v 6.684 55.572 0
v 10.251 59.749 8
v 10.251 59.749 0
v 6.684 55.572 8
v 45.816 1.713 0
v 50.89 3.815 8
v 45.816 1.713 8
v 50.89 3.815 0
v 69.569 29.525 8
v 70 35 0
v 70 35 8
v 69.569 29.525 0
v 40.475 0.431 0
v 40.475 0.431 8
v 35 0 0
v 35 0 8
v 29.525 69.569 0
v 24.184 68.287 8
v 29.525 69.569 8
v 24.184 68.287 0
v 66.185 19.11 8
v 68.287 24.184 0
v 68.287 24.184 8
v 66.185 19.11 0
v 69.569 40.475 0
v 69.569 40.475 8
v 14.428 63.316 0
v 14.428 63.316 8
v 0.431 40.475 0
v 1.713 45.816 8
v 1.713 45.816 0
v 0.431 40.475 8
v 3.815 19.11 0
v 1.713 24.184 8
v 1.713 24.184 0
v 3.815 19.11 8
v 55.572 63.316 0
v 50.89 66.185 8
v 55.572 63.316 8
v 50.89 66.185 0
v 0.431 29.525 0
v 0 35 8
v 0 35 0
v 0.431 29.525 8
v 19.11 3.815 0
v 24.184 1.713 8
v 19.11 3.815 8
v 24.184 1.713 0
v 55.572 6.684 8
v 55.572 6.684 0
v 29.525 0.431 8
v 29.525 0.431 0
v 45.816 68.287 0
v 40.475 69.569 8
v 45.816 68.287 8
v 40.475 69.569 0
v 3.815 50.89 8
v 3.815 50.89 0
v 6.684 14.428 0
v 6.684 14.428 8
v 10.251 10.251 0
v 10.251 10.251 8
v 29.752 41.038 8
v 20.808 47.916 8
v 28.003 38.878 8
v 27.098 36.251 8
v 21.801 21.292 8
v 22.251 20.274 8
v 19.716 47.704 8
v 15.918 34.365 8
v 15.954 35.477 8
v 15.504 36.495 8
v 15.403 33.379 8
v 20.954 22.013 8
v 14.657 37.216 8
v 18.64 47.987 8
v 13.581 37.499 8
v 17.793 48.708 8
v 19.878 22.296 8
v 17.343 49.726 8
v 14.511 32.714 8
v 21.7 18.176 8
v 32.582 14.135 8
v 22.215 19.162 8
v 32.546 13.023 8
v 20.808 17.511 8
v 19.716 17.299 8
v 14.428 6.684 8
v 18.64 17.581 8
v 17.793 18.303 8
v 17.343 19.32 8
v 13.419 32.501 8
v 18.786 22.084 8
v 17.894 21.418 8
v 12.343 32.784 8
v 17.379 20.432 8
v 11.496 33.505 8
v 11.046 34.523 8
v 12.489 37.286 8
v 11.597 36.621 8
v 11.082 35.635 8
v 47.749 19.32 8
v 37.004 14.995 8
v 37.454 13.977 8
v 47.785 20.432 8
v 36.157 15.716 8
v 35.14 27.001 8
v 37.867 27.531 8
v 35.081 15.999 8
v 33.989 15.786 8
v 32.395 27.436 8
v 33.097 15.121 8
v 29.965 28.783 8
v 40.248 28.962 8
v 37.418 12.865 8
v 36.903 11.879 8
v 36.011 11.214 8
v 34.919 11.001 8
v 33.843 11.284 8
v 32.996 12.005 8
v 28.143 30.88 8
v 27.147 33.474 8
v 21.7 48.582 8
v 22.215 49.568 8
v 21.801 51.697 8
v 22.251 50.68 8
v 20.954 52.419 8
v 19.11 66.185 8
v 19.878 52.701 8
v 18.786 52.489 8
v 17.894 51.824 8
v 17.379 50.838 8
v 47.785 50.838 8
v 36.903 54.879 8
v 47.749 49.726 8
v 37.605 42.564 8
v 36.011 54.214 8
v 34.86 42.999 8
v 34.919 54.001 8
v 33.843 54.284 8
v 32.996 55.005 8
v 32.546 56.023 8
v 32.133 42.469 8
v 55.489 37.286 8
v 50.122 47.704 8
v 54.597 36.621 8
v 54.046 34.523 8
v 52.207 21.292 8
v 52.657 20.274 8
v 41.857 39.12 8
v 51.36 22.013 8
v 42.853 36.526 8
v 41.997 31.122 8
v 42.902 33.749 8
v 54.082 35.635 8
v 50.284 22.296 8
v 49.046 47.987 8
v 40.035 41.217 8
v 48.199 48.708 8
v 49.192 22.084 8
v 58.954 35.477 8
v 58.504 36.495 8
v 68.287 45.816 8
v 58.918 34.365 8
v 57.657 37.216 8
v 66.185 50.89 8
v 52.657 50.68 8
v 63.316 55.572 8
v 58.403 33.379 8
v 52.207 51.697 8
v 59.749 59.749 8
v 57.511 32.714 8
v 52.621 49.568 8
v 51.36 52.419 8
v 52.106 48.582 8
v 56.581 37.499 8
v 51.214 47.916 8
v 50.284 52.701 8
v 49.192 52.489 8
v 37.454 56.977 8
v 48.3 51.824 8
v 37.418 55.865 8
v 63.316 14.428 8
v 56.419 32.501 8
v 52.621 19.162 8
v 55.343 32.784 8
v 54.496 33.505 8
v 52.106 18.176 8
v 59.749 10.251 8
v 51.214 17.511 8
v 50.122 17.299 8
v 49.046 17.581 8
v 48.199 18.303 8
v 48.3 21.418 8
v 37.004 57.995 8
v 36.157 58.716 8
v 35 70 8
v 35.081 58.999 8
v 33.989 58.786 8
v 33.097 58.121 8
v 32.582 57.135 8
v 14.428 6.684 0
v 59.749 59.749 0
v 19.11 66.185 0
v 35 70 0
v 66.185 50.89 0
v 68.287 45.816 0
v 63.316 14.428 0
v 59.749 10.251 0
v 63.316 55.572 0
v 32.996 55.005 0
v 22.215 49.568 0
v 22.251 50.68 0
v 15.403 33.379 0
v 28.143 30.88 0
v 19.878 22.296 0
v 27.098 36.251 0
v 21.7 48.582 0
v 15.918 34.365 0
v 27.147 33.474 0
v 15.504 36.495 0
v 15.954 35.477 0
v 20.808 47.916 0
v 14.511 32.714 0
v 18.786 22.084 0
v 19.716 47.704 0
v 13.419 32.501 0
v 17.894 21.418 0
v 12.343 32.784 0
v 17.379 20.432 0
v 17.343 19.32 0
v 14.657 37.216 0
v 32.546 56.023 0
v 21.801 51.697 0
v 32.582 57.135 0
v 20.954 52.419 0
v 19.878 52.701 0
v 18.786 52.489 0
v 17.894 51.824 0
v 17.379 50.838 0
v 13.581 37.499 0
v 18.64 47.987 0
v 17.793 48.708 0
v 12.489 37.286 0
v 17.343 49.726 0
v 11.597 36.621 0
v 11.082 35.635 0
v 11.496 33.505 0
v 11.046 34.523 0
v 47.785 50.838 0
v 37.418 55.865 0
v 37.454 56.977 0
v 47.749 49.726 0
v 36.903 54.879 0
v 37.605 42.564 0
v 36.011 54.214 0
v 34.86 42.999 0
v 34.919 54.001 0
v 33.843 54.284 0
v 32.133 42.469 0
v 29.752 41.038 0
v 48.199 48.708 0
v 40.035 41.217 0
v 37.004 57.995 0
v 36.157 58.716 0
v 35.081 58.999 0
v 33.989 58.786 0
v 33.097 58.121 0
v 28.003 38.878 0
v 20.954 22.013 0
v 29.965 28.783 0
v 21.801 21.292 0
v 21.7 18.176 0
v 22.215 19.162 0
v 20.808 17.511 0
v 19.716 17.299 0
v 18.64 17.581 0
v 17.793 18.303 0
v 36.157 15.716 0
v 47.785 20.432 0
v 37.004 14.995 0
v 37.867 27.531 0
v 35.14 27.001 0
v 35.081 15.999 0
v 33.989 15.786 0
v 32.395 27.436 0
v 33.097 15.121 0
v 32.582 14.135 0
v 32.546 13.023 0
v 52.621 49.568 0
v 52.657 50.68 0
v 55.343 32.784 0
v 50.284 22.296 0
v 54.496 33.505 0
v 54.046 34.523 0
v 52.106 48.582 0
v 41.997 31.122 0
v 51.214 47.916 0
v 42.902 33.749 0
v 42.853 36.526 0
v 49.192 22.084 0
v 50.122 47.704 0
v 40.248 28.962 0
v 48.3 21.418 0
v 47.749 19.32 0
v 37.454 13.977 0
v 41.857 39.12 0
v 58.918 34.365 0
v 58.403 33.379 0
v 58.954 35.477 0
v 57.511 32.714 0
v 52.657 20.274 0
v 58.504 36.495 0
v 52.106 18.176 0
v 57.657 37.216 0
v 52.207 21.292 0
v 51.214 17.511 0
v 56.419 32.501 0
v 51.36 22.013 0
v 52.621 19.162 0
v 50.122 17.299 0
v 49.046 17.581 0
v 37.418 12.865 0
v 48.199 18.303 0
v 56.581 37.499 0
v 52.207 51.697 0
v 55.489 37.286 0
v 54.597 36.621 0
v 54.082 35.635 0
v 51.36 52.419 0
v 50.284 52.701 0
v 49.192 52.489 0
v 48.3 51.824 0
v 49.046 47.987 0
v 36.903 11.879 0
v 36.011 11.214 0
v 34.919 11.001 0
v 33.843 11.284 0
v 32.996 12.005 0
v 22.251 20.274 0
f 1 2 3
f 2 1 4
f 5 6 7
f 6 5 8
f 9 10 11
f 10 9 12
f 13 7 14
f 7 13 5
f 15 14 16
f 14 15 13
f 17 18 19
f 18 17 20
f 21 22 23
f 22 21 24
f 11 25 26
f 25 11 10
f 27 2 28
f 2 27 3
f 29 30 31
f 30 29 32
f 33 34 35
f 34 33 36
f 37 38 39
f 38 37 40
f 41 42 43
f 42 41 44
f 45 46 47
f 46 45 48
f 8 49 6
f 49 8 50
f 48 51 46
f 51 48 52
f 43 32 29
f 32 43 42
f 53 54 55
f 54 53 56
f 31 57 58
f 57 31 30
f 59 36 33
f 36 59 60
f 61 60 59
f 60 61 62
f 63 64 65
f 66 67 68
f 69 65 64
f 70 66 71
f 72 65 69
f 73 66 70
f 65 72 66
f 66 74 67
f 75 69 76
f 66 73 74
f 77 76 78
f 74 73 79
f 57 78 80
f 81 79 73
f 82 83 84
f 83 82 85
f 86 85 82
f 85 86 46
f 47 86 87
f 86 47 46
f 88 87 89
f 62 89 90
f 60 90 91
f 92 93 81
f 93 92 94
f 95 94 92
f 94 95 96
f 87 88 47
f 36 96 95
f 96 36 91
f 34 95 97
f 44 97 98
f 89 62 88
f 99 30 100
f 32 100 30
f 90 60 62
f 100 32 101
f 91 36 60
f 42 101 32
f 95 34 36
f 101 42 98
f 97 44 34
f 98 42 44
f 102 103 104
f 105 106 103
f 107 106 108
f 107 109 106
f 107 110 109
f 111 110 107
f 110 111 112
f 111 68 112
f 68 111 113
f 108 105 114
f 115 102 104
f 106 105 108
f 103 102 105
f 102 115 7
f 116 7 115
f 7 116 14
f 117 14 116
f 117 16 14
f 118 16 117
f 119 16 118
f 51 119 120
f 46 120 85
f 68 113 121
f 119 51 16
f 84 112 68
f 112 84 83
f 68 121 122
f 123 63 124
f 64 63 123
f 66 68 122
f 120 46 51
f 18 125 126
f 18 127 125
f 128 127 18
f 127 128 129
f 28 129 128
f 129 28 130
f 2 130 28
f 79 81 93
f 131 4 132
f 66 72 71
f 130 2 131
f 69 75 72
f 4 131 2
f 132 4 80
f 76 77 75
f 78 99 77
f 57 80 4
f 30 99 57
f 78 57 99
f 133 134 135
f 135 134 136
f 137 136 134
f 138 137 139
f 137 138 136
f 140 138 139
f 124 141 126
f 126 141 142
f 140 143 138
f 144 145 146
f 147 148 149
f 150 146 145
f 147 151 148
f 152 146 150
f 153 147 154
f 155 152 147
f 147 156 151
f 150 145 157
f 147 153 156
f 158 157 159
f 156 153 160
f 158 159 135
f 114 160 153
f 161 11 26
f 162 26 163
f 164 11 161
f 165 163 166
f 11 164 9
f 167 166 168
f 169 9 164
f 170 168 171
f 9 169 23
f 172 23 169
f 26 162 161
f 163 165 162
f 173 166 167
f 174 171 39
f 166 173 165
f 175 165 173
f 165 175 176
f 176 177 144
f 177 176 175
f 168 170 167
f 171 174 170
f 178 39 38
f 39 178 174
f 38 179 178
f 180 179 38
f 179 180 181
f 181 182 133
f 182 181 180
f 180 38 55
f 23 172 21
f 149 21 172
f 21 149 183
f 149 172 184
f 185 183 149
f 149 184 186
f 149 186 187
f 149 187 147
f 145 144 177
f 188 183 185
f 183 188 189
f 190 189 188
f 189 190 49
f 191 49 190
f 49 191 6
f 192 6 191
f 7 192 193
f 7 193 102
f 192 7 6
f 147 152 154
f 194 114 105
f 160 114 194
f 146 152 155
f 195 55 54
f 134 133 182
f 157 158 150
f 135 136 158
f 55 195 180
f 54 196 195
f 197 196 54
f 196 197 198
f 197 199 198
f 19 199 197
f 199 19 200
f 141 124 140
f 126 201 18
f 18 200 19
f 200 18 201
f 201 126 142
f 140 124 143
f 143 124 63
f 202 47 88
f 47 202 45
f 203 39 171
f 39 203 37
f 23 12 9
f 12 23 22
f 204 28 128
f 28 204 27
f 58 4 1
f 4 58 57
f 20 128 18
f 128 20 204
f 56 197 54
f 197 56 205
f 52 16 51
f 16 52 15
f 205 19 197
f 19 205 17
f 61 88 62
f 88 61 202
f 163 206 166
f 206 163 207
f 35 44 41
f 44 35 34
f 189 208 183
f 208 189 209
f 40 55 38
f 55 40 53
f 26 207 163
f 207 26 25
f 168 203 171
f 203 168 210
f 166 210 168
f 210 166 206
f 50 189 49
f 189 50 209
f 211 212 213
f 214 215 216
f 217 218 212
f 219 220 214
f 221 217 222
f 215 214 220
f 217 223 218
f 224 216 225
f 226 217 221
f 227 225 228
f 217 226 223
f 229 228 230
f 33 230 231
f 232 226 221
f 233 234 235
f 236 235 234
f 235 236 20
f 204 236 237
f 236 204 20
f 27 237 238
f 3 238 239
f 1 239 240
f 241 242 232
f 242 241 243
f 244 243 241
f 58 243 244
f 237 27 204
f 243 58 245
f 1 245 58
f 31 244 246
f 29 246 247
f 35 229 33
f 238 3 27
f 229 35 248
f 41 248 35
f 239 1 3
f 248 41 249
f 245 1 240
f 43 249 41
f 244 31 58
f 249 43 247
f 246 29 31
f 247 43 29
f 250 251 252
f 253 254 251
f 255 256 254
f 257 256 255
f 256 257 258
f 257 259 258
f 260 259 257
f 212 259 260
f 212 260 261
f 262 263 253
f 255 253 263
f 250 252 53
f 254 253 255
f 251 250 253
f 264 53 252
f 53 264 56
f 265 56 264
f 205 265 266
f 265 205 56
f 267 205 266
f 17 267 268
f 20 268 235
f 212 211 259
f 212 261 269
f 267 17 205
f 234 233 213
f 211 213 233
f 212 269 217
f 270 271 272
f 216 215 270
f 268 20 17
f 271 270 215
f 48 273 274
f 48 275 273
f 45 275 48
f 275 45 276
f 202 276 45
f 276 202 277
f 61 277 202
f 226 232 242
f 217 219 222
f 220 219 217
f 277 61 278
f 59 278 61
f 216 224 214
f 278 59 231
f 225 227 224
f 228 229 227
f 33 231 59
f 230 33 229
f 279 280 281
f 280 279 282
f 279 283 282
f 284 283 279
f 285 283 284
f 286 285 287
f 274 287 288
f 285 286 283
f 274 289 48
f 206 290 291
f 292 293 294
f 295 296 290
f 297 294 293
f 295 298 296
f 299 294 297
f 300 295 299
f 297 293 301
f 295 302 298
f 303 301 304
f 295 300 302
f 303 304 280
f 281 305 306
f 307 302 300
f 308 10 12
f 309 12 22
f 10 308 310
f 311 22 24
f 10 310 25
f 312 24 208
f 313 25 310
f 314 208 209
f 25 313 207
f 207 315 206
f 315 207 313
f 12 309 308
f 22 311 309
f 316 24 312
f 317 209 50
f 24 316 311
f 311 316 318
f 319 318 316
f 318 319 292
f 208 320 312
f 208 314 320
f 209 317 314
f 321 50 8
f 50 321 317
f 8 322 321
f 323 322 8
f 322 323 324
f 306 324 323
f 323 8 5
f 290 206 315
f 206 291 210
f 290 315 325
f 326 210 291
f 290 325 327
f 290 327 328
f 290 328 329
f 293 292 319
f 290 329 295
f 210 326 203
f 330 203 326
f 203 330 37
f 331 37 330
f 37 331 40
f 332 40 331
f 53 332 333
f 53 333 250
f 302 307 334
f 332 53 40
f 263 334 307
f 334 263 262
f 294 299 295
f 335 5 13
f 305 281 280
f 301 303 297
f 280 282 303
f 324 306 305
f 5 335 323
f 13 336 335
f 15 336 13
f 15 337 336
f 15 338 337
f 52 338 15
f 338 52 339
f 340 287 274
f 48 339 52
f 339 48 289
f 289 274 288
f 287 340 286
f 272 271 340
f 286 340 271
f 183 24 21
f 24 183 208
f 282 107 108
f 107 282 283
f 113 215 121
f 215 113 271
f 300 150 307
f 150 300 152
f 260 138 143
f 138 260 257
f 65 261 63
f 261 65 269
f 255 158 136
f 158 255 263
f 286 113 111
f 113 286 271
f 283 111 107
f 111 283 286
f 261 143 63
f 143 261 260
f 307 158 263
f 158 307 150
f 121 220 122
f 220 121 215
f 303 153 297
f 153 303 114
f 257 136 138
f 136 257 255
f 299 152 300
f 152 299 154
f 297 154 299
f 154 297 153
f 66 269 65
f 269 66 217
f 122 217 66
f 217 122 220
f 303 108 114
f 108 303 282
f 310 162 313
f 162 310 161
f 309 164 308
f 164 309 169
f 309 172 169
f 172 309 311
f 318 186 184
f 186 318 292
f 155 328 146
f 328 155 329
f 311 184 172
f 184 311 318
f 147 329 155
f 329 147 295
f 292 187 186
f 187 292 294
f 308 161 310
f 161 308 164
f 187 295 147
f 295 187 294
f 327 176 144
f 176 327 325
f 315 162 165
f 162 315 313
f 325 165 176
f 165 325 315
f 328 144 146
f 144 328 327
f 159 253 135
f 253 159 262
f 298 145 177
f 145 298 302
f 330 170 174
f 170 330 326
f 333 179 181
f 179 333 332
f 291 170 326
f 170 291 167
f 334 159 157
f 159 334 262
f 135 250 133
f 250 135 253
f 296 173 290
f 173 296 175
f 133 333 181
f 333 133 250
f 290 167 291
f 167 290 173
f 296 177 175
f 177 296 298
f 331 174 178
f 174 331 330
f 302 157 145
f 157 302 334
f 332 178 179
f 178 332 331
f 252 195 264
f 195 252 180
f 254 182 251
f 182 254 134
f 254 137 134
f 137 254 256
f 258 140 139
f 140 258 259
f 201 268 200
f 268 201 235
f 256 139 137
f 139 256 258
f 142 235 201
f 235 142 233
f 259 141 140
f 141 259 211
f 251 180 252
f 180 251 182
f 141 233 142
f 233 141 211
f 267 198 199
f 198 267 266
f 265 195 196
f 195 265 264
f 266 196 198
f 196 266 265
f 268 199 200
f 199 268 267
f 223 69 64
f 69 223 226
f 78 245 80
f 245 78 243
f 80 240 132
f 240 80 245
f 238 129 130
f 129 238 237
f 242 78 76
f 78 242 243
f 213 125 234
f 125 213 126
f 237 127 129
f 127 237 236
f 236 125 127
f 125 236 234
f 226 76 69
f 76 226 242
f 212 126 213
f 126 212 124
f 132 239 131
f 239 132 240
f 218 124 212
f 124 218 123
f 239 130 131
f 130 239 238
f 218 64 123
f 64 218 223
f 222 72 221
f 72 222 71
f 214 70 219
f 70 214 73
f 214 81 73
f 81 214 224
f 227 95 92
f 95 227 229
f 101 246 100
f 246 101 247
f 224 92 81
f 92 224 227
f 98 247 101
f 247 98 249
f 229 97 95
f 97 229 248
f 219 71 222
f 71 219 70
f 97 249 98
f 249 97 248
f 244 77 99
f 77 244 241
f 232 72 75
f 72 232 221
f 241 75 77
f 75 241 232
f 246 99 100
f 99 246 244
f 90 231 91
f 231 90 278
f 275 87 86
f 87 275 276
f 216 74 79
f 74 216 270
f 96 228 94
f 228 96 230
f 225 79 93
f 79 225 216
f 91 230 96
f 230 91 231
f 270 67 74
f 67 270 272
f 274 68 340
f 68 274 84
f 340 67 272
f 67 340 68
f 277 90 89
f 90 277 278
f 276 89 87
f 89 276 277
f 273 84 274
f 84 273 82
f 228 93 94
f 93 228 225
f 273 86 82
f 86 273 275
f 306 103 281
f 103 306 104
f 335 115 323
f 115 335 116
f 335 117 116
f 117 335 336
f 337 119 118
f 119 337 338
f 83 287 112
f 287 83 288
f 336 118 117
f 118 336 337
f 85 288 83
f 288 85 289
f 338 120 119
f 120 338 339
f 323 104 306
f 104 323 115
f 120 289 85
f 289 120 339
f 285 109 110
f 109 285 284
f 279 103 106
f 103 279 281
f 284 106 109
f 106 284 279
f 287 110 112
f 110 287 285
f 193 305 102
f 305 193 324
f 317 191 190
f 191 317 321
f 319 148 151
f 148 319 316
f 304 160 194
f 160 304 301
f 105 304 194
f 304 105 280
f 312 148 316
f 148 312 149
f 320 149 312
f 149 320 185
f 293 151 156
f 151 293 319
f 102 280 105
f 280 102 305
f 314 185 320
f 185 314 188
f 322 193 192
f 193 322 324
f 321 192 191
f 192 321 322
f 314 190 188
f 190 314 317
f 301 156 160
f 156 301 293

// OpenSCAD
$fn = 32;

// ----------------------------------------------------------------------
// Spacer plate: round flange R35, 8 bolts
// ----------------------------------------------------------------------

// --- parameters (mm) ---
bore_r = 8;               // centre bore radius
bolt_r = 2.5;             // bolt hole radius
plate_t = 8;              // plate thickness, Z (extrusion height)
flange_r = 35;            // flange radius
n_bolt = 8;               // bolt hole count
ring_r = 21.5;            // bolt circle radius

profile = [[70, 35], [69.569, 40.475], [68.287, 45.816], [66.185, 50.89], [63.316, 55.572], [59.749, 59.749], [55.572, 63.316], [50.89, 66.185], [45.816, 68.287], [40.475, 69.569], [35, 70], [29.525, 69.569], [24.184, 68.287], [19.11, 66.185], [14.428, 63.316], [10.251, 59.749], [6.684, 55.572], [3.815, 50.89], [1.713, 45.816], [0.431, 40.475], [0, 35], [0.431, 29.525], [1.713, 24.184], [3.815, 19.11], [6.684, 14.428], [10.251, 10.251], [14.428, 6.684], [19.11, 3.815], [24.184, 1.713], [29.525, 0.431], [35, 0], [40.475, 0.431], [45.816, 1.713], [50.89, 3.815], [55.572, 6.684], [59.749, 10.251], [63.316, 14.428], [66.185, 19.11], [68.287, 24.184], [69.569, 29.525]];  // primary outline, 40 points, counter clockwise
void_1 = [[42.853, 36.526], [41.857, 39.12], [40.035, 41.217], [37.605, 42.564], [34.86, 42.999], [32.133, 42.469], [29.752, 41.038], [28.003, 38.878], [27.098, 36.251], [27.147, 33.474], [28.143, 30.88], [29.965, 28.783], [32.395, 27.436], [35.14, 27.001], [37.867, 27.531], [40.248, 28.962], [41.997, 31.122], [42.902, 33.749]];  // centre bore, 18 points
void_2 = [[58.954, 35.477], [58.504, 36.495], [57.657, 37.216], [56.581, 37.499], [55.489, 37.286], [54.597, 36.621], [54.082, 35.635], [54.046, 34.523], [54.496, 33.505], [55.343, 32.784], [56.419, 32.501], [57.511, 32.714], [58.403, 33.379], [58.918, 34.365]];  // bolt hole 1, 14 points
void_3 = [[52.657, 50.68], [52.207, 51.697], [51.36, 52.419], [50.284, 52.701], [49.192, 52.489], [48.3, 51.824], [47.785, 50.838], [47.749, 49.726], [48.199, 48.708], [49.046, 47.987], [50.122, 47.704], [51.214, 47.916], [52.106, 48.582], [52.621, 49.568]];  // bolt hole 2, 14 points
void_4 = [[37.454, 56.977], [37.004, 57.995], [36.157, 58.716], [35.081, 58.999], [33.989, 58.786], [33.097, 58.121], [32.582, 57.135], [32.546, 56.023], [32.996, 55.005], [33.843, 54.284], [34.919, 54.001], [36.011, 54.214], [36.903, 54.879], [37.418, 55.865]];  // bolt hole 3, 14 points
void_5 = [[22.251, 50.68], [21.801, 51.697], [20.954, 52.419], [19.878, 52.701], [18.786, 52.489], [17.894, 51.824], [17.379, 50.838], [17.343, 49.726], [17.793, 48.708], [18.64, 47.987], [19.716, 47.704], [20.808, 47.916], [21.7, 48.582], [22.215, 49.568]];  // bolt hole 4, 14 points
void_6 = [[15.954, 35.477], [15.504, 36.495], [14.657, 37.216], [13.581, 37.499], [12.489, 37.286], [11.597, 36.621], [11.082, 35.635], [11.046, 34.523], [11.496, 33.505], [12.343, 32.784], [13.419, 32.501], [14.511, 32.714], [15.403, 33.379], [15.918, 34.365]];  // bolt hole 5, 14 points
void_7 = [[22.251, 20.274], [21.801, 21.292], [20.954, 22.013], [19.878, 22.296], [18.786, 22.084], [17.894, 21.418], [17.379, 20.432], [17.343, 19.32], [17.793, 18.303], [18.64, 17.581], [19.716, 17.299], [20.808, 17.511], [21.7, 18.176], [22.215, 19.162]];  // bolt hole 6, 14 points
void_8 = [[37.454, 13.977], [37.004, 14.995], [36.157, 15.716], [35.081, 15.999], [33.989, 15.786], [33.097, 15.121], [32.582, 14.135], [32.546, 13.023], [32.996, 12.005], [33.843, 11.284], [34.919, 11.001], [36.011, 11.214], [36.903, 11.879], [37.418, 12.865]];  // bolt hole 7, 14 points
void_9 = [[52.657, 20.274], [52.207, 21.292], [51.36, 22.013], [50.284, 22.296], [49.192, 22.084], [48.3, 21.418], [47.785, 20.432], [47.749, 19.32], [48.199, 18.303], [49.046, 17.581], [50.122, 17.299], [51.214, 17.511], [52.106, 18.176], [52.621, 19.162]];  // bolt hole 8, 14 points

// --- the one profile operation ---
difference() {
  linear_extrude(height = plate_t) polygon(points = profile);
  translate([0, 0, -1])
    linear_extrude(height = plate_t + 2) polygon(points = void_1);
  translate([0, 0, -1])
    linear_extrude(height = plate_t + 2) polygon(points = void_2);
  translate([0, 0, -1])
    linear_extrude(height = plate_t + 2) polygon(points = void_3);
  translate([0, 0, -1])
    linear_extrude(height = plate_t + 2) polygon(points = void_4);
  translate([0, 0, -1])
    linear_extrude(height = plate_t + 2) polygon(points = void_5);
  translate([0, 0, -1])
    linear_extrude(height = plate_t + 2) polygon(points = void_6);
  translate([0, 0, -1])
    linear_extrude(height = plate_t + 2) polygon(points = void_7);
  translate([0, 0, -1])
    linear_extrude(height = plate_t + 2) polygon(points = void_8);
  translate([0, 0, -1])
    linear_extrude(height = plate_t + 2) polygon(points = void_9);
}
